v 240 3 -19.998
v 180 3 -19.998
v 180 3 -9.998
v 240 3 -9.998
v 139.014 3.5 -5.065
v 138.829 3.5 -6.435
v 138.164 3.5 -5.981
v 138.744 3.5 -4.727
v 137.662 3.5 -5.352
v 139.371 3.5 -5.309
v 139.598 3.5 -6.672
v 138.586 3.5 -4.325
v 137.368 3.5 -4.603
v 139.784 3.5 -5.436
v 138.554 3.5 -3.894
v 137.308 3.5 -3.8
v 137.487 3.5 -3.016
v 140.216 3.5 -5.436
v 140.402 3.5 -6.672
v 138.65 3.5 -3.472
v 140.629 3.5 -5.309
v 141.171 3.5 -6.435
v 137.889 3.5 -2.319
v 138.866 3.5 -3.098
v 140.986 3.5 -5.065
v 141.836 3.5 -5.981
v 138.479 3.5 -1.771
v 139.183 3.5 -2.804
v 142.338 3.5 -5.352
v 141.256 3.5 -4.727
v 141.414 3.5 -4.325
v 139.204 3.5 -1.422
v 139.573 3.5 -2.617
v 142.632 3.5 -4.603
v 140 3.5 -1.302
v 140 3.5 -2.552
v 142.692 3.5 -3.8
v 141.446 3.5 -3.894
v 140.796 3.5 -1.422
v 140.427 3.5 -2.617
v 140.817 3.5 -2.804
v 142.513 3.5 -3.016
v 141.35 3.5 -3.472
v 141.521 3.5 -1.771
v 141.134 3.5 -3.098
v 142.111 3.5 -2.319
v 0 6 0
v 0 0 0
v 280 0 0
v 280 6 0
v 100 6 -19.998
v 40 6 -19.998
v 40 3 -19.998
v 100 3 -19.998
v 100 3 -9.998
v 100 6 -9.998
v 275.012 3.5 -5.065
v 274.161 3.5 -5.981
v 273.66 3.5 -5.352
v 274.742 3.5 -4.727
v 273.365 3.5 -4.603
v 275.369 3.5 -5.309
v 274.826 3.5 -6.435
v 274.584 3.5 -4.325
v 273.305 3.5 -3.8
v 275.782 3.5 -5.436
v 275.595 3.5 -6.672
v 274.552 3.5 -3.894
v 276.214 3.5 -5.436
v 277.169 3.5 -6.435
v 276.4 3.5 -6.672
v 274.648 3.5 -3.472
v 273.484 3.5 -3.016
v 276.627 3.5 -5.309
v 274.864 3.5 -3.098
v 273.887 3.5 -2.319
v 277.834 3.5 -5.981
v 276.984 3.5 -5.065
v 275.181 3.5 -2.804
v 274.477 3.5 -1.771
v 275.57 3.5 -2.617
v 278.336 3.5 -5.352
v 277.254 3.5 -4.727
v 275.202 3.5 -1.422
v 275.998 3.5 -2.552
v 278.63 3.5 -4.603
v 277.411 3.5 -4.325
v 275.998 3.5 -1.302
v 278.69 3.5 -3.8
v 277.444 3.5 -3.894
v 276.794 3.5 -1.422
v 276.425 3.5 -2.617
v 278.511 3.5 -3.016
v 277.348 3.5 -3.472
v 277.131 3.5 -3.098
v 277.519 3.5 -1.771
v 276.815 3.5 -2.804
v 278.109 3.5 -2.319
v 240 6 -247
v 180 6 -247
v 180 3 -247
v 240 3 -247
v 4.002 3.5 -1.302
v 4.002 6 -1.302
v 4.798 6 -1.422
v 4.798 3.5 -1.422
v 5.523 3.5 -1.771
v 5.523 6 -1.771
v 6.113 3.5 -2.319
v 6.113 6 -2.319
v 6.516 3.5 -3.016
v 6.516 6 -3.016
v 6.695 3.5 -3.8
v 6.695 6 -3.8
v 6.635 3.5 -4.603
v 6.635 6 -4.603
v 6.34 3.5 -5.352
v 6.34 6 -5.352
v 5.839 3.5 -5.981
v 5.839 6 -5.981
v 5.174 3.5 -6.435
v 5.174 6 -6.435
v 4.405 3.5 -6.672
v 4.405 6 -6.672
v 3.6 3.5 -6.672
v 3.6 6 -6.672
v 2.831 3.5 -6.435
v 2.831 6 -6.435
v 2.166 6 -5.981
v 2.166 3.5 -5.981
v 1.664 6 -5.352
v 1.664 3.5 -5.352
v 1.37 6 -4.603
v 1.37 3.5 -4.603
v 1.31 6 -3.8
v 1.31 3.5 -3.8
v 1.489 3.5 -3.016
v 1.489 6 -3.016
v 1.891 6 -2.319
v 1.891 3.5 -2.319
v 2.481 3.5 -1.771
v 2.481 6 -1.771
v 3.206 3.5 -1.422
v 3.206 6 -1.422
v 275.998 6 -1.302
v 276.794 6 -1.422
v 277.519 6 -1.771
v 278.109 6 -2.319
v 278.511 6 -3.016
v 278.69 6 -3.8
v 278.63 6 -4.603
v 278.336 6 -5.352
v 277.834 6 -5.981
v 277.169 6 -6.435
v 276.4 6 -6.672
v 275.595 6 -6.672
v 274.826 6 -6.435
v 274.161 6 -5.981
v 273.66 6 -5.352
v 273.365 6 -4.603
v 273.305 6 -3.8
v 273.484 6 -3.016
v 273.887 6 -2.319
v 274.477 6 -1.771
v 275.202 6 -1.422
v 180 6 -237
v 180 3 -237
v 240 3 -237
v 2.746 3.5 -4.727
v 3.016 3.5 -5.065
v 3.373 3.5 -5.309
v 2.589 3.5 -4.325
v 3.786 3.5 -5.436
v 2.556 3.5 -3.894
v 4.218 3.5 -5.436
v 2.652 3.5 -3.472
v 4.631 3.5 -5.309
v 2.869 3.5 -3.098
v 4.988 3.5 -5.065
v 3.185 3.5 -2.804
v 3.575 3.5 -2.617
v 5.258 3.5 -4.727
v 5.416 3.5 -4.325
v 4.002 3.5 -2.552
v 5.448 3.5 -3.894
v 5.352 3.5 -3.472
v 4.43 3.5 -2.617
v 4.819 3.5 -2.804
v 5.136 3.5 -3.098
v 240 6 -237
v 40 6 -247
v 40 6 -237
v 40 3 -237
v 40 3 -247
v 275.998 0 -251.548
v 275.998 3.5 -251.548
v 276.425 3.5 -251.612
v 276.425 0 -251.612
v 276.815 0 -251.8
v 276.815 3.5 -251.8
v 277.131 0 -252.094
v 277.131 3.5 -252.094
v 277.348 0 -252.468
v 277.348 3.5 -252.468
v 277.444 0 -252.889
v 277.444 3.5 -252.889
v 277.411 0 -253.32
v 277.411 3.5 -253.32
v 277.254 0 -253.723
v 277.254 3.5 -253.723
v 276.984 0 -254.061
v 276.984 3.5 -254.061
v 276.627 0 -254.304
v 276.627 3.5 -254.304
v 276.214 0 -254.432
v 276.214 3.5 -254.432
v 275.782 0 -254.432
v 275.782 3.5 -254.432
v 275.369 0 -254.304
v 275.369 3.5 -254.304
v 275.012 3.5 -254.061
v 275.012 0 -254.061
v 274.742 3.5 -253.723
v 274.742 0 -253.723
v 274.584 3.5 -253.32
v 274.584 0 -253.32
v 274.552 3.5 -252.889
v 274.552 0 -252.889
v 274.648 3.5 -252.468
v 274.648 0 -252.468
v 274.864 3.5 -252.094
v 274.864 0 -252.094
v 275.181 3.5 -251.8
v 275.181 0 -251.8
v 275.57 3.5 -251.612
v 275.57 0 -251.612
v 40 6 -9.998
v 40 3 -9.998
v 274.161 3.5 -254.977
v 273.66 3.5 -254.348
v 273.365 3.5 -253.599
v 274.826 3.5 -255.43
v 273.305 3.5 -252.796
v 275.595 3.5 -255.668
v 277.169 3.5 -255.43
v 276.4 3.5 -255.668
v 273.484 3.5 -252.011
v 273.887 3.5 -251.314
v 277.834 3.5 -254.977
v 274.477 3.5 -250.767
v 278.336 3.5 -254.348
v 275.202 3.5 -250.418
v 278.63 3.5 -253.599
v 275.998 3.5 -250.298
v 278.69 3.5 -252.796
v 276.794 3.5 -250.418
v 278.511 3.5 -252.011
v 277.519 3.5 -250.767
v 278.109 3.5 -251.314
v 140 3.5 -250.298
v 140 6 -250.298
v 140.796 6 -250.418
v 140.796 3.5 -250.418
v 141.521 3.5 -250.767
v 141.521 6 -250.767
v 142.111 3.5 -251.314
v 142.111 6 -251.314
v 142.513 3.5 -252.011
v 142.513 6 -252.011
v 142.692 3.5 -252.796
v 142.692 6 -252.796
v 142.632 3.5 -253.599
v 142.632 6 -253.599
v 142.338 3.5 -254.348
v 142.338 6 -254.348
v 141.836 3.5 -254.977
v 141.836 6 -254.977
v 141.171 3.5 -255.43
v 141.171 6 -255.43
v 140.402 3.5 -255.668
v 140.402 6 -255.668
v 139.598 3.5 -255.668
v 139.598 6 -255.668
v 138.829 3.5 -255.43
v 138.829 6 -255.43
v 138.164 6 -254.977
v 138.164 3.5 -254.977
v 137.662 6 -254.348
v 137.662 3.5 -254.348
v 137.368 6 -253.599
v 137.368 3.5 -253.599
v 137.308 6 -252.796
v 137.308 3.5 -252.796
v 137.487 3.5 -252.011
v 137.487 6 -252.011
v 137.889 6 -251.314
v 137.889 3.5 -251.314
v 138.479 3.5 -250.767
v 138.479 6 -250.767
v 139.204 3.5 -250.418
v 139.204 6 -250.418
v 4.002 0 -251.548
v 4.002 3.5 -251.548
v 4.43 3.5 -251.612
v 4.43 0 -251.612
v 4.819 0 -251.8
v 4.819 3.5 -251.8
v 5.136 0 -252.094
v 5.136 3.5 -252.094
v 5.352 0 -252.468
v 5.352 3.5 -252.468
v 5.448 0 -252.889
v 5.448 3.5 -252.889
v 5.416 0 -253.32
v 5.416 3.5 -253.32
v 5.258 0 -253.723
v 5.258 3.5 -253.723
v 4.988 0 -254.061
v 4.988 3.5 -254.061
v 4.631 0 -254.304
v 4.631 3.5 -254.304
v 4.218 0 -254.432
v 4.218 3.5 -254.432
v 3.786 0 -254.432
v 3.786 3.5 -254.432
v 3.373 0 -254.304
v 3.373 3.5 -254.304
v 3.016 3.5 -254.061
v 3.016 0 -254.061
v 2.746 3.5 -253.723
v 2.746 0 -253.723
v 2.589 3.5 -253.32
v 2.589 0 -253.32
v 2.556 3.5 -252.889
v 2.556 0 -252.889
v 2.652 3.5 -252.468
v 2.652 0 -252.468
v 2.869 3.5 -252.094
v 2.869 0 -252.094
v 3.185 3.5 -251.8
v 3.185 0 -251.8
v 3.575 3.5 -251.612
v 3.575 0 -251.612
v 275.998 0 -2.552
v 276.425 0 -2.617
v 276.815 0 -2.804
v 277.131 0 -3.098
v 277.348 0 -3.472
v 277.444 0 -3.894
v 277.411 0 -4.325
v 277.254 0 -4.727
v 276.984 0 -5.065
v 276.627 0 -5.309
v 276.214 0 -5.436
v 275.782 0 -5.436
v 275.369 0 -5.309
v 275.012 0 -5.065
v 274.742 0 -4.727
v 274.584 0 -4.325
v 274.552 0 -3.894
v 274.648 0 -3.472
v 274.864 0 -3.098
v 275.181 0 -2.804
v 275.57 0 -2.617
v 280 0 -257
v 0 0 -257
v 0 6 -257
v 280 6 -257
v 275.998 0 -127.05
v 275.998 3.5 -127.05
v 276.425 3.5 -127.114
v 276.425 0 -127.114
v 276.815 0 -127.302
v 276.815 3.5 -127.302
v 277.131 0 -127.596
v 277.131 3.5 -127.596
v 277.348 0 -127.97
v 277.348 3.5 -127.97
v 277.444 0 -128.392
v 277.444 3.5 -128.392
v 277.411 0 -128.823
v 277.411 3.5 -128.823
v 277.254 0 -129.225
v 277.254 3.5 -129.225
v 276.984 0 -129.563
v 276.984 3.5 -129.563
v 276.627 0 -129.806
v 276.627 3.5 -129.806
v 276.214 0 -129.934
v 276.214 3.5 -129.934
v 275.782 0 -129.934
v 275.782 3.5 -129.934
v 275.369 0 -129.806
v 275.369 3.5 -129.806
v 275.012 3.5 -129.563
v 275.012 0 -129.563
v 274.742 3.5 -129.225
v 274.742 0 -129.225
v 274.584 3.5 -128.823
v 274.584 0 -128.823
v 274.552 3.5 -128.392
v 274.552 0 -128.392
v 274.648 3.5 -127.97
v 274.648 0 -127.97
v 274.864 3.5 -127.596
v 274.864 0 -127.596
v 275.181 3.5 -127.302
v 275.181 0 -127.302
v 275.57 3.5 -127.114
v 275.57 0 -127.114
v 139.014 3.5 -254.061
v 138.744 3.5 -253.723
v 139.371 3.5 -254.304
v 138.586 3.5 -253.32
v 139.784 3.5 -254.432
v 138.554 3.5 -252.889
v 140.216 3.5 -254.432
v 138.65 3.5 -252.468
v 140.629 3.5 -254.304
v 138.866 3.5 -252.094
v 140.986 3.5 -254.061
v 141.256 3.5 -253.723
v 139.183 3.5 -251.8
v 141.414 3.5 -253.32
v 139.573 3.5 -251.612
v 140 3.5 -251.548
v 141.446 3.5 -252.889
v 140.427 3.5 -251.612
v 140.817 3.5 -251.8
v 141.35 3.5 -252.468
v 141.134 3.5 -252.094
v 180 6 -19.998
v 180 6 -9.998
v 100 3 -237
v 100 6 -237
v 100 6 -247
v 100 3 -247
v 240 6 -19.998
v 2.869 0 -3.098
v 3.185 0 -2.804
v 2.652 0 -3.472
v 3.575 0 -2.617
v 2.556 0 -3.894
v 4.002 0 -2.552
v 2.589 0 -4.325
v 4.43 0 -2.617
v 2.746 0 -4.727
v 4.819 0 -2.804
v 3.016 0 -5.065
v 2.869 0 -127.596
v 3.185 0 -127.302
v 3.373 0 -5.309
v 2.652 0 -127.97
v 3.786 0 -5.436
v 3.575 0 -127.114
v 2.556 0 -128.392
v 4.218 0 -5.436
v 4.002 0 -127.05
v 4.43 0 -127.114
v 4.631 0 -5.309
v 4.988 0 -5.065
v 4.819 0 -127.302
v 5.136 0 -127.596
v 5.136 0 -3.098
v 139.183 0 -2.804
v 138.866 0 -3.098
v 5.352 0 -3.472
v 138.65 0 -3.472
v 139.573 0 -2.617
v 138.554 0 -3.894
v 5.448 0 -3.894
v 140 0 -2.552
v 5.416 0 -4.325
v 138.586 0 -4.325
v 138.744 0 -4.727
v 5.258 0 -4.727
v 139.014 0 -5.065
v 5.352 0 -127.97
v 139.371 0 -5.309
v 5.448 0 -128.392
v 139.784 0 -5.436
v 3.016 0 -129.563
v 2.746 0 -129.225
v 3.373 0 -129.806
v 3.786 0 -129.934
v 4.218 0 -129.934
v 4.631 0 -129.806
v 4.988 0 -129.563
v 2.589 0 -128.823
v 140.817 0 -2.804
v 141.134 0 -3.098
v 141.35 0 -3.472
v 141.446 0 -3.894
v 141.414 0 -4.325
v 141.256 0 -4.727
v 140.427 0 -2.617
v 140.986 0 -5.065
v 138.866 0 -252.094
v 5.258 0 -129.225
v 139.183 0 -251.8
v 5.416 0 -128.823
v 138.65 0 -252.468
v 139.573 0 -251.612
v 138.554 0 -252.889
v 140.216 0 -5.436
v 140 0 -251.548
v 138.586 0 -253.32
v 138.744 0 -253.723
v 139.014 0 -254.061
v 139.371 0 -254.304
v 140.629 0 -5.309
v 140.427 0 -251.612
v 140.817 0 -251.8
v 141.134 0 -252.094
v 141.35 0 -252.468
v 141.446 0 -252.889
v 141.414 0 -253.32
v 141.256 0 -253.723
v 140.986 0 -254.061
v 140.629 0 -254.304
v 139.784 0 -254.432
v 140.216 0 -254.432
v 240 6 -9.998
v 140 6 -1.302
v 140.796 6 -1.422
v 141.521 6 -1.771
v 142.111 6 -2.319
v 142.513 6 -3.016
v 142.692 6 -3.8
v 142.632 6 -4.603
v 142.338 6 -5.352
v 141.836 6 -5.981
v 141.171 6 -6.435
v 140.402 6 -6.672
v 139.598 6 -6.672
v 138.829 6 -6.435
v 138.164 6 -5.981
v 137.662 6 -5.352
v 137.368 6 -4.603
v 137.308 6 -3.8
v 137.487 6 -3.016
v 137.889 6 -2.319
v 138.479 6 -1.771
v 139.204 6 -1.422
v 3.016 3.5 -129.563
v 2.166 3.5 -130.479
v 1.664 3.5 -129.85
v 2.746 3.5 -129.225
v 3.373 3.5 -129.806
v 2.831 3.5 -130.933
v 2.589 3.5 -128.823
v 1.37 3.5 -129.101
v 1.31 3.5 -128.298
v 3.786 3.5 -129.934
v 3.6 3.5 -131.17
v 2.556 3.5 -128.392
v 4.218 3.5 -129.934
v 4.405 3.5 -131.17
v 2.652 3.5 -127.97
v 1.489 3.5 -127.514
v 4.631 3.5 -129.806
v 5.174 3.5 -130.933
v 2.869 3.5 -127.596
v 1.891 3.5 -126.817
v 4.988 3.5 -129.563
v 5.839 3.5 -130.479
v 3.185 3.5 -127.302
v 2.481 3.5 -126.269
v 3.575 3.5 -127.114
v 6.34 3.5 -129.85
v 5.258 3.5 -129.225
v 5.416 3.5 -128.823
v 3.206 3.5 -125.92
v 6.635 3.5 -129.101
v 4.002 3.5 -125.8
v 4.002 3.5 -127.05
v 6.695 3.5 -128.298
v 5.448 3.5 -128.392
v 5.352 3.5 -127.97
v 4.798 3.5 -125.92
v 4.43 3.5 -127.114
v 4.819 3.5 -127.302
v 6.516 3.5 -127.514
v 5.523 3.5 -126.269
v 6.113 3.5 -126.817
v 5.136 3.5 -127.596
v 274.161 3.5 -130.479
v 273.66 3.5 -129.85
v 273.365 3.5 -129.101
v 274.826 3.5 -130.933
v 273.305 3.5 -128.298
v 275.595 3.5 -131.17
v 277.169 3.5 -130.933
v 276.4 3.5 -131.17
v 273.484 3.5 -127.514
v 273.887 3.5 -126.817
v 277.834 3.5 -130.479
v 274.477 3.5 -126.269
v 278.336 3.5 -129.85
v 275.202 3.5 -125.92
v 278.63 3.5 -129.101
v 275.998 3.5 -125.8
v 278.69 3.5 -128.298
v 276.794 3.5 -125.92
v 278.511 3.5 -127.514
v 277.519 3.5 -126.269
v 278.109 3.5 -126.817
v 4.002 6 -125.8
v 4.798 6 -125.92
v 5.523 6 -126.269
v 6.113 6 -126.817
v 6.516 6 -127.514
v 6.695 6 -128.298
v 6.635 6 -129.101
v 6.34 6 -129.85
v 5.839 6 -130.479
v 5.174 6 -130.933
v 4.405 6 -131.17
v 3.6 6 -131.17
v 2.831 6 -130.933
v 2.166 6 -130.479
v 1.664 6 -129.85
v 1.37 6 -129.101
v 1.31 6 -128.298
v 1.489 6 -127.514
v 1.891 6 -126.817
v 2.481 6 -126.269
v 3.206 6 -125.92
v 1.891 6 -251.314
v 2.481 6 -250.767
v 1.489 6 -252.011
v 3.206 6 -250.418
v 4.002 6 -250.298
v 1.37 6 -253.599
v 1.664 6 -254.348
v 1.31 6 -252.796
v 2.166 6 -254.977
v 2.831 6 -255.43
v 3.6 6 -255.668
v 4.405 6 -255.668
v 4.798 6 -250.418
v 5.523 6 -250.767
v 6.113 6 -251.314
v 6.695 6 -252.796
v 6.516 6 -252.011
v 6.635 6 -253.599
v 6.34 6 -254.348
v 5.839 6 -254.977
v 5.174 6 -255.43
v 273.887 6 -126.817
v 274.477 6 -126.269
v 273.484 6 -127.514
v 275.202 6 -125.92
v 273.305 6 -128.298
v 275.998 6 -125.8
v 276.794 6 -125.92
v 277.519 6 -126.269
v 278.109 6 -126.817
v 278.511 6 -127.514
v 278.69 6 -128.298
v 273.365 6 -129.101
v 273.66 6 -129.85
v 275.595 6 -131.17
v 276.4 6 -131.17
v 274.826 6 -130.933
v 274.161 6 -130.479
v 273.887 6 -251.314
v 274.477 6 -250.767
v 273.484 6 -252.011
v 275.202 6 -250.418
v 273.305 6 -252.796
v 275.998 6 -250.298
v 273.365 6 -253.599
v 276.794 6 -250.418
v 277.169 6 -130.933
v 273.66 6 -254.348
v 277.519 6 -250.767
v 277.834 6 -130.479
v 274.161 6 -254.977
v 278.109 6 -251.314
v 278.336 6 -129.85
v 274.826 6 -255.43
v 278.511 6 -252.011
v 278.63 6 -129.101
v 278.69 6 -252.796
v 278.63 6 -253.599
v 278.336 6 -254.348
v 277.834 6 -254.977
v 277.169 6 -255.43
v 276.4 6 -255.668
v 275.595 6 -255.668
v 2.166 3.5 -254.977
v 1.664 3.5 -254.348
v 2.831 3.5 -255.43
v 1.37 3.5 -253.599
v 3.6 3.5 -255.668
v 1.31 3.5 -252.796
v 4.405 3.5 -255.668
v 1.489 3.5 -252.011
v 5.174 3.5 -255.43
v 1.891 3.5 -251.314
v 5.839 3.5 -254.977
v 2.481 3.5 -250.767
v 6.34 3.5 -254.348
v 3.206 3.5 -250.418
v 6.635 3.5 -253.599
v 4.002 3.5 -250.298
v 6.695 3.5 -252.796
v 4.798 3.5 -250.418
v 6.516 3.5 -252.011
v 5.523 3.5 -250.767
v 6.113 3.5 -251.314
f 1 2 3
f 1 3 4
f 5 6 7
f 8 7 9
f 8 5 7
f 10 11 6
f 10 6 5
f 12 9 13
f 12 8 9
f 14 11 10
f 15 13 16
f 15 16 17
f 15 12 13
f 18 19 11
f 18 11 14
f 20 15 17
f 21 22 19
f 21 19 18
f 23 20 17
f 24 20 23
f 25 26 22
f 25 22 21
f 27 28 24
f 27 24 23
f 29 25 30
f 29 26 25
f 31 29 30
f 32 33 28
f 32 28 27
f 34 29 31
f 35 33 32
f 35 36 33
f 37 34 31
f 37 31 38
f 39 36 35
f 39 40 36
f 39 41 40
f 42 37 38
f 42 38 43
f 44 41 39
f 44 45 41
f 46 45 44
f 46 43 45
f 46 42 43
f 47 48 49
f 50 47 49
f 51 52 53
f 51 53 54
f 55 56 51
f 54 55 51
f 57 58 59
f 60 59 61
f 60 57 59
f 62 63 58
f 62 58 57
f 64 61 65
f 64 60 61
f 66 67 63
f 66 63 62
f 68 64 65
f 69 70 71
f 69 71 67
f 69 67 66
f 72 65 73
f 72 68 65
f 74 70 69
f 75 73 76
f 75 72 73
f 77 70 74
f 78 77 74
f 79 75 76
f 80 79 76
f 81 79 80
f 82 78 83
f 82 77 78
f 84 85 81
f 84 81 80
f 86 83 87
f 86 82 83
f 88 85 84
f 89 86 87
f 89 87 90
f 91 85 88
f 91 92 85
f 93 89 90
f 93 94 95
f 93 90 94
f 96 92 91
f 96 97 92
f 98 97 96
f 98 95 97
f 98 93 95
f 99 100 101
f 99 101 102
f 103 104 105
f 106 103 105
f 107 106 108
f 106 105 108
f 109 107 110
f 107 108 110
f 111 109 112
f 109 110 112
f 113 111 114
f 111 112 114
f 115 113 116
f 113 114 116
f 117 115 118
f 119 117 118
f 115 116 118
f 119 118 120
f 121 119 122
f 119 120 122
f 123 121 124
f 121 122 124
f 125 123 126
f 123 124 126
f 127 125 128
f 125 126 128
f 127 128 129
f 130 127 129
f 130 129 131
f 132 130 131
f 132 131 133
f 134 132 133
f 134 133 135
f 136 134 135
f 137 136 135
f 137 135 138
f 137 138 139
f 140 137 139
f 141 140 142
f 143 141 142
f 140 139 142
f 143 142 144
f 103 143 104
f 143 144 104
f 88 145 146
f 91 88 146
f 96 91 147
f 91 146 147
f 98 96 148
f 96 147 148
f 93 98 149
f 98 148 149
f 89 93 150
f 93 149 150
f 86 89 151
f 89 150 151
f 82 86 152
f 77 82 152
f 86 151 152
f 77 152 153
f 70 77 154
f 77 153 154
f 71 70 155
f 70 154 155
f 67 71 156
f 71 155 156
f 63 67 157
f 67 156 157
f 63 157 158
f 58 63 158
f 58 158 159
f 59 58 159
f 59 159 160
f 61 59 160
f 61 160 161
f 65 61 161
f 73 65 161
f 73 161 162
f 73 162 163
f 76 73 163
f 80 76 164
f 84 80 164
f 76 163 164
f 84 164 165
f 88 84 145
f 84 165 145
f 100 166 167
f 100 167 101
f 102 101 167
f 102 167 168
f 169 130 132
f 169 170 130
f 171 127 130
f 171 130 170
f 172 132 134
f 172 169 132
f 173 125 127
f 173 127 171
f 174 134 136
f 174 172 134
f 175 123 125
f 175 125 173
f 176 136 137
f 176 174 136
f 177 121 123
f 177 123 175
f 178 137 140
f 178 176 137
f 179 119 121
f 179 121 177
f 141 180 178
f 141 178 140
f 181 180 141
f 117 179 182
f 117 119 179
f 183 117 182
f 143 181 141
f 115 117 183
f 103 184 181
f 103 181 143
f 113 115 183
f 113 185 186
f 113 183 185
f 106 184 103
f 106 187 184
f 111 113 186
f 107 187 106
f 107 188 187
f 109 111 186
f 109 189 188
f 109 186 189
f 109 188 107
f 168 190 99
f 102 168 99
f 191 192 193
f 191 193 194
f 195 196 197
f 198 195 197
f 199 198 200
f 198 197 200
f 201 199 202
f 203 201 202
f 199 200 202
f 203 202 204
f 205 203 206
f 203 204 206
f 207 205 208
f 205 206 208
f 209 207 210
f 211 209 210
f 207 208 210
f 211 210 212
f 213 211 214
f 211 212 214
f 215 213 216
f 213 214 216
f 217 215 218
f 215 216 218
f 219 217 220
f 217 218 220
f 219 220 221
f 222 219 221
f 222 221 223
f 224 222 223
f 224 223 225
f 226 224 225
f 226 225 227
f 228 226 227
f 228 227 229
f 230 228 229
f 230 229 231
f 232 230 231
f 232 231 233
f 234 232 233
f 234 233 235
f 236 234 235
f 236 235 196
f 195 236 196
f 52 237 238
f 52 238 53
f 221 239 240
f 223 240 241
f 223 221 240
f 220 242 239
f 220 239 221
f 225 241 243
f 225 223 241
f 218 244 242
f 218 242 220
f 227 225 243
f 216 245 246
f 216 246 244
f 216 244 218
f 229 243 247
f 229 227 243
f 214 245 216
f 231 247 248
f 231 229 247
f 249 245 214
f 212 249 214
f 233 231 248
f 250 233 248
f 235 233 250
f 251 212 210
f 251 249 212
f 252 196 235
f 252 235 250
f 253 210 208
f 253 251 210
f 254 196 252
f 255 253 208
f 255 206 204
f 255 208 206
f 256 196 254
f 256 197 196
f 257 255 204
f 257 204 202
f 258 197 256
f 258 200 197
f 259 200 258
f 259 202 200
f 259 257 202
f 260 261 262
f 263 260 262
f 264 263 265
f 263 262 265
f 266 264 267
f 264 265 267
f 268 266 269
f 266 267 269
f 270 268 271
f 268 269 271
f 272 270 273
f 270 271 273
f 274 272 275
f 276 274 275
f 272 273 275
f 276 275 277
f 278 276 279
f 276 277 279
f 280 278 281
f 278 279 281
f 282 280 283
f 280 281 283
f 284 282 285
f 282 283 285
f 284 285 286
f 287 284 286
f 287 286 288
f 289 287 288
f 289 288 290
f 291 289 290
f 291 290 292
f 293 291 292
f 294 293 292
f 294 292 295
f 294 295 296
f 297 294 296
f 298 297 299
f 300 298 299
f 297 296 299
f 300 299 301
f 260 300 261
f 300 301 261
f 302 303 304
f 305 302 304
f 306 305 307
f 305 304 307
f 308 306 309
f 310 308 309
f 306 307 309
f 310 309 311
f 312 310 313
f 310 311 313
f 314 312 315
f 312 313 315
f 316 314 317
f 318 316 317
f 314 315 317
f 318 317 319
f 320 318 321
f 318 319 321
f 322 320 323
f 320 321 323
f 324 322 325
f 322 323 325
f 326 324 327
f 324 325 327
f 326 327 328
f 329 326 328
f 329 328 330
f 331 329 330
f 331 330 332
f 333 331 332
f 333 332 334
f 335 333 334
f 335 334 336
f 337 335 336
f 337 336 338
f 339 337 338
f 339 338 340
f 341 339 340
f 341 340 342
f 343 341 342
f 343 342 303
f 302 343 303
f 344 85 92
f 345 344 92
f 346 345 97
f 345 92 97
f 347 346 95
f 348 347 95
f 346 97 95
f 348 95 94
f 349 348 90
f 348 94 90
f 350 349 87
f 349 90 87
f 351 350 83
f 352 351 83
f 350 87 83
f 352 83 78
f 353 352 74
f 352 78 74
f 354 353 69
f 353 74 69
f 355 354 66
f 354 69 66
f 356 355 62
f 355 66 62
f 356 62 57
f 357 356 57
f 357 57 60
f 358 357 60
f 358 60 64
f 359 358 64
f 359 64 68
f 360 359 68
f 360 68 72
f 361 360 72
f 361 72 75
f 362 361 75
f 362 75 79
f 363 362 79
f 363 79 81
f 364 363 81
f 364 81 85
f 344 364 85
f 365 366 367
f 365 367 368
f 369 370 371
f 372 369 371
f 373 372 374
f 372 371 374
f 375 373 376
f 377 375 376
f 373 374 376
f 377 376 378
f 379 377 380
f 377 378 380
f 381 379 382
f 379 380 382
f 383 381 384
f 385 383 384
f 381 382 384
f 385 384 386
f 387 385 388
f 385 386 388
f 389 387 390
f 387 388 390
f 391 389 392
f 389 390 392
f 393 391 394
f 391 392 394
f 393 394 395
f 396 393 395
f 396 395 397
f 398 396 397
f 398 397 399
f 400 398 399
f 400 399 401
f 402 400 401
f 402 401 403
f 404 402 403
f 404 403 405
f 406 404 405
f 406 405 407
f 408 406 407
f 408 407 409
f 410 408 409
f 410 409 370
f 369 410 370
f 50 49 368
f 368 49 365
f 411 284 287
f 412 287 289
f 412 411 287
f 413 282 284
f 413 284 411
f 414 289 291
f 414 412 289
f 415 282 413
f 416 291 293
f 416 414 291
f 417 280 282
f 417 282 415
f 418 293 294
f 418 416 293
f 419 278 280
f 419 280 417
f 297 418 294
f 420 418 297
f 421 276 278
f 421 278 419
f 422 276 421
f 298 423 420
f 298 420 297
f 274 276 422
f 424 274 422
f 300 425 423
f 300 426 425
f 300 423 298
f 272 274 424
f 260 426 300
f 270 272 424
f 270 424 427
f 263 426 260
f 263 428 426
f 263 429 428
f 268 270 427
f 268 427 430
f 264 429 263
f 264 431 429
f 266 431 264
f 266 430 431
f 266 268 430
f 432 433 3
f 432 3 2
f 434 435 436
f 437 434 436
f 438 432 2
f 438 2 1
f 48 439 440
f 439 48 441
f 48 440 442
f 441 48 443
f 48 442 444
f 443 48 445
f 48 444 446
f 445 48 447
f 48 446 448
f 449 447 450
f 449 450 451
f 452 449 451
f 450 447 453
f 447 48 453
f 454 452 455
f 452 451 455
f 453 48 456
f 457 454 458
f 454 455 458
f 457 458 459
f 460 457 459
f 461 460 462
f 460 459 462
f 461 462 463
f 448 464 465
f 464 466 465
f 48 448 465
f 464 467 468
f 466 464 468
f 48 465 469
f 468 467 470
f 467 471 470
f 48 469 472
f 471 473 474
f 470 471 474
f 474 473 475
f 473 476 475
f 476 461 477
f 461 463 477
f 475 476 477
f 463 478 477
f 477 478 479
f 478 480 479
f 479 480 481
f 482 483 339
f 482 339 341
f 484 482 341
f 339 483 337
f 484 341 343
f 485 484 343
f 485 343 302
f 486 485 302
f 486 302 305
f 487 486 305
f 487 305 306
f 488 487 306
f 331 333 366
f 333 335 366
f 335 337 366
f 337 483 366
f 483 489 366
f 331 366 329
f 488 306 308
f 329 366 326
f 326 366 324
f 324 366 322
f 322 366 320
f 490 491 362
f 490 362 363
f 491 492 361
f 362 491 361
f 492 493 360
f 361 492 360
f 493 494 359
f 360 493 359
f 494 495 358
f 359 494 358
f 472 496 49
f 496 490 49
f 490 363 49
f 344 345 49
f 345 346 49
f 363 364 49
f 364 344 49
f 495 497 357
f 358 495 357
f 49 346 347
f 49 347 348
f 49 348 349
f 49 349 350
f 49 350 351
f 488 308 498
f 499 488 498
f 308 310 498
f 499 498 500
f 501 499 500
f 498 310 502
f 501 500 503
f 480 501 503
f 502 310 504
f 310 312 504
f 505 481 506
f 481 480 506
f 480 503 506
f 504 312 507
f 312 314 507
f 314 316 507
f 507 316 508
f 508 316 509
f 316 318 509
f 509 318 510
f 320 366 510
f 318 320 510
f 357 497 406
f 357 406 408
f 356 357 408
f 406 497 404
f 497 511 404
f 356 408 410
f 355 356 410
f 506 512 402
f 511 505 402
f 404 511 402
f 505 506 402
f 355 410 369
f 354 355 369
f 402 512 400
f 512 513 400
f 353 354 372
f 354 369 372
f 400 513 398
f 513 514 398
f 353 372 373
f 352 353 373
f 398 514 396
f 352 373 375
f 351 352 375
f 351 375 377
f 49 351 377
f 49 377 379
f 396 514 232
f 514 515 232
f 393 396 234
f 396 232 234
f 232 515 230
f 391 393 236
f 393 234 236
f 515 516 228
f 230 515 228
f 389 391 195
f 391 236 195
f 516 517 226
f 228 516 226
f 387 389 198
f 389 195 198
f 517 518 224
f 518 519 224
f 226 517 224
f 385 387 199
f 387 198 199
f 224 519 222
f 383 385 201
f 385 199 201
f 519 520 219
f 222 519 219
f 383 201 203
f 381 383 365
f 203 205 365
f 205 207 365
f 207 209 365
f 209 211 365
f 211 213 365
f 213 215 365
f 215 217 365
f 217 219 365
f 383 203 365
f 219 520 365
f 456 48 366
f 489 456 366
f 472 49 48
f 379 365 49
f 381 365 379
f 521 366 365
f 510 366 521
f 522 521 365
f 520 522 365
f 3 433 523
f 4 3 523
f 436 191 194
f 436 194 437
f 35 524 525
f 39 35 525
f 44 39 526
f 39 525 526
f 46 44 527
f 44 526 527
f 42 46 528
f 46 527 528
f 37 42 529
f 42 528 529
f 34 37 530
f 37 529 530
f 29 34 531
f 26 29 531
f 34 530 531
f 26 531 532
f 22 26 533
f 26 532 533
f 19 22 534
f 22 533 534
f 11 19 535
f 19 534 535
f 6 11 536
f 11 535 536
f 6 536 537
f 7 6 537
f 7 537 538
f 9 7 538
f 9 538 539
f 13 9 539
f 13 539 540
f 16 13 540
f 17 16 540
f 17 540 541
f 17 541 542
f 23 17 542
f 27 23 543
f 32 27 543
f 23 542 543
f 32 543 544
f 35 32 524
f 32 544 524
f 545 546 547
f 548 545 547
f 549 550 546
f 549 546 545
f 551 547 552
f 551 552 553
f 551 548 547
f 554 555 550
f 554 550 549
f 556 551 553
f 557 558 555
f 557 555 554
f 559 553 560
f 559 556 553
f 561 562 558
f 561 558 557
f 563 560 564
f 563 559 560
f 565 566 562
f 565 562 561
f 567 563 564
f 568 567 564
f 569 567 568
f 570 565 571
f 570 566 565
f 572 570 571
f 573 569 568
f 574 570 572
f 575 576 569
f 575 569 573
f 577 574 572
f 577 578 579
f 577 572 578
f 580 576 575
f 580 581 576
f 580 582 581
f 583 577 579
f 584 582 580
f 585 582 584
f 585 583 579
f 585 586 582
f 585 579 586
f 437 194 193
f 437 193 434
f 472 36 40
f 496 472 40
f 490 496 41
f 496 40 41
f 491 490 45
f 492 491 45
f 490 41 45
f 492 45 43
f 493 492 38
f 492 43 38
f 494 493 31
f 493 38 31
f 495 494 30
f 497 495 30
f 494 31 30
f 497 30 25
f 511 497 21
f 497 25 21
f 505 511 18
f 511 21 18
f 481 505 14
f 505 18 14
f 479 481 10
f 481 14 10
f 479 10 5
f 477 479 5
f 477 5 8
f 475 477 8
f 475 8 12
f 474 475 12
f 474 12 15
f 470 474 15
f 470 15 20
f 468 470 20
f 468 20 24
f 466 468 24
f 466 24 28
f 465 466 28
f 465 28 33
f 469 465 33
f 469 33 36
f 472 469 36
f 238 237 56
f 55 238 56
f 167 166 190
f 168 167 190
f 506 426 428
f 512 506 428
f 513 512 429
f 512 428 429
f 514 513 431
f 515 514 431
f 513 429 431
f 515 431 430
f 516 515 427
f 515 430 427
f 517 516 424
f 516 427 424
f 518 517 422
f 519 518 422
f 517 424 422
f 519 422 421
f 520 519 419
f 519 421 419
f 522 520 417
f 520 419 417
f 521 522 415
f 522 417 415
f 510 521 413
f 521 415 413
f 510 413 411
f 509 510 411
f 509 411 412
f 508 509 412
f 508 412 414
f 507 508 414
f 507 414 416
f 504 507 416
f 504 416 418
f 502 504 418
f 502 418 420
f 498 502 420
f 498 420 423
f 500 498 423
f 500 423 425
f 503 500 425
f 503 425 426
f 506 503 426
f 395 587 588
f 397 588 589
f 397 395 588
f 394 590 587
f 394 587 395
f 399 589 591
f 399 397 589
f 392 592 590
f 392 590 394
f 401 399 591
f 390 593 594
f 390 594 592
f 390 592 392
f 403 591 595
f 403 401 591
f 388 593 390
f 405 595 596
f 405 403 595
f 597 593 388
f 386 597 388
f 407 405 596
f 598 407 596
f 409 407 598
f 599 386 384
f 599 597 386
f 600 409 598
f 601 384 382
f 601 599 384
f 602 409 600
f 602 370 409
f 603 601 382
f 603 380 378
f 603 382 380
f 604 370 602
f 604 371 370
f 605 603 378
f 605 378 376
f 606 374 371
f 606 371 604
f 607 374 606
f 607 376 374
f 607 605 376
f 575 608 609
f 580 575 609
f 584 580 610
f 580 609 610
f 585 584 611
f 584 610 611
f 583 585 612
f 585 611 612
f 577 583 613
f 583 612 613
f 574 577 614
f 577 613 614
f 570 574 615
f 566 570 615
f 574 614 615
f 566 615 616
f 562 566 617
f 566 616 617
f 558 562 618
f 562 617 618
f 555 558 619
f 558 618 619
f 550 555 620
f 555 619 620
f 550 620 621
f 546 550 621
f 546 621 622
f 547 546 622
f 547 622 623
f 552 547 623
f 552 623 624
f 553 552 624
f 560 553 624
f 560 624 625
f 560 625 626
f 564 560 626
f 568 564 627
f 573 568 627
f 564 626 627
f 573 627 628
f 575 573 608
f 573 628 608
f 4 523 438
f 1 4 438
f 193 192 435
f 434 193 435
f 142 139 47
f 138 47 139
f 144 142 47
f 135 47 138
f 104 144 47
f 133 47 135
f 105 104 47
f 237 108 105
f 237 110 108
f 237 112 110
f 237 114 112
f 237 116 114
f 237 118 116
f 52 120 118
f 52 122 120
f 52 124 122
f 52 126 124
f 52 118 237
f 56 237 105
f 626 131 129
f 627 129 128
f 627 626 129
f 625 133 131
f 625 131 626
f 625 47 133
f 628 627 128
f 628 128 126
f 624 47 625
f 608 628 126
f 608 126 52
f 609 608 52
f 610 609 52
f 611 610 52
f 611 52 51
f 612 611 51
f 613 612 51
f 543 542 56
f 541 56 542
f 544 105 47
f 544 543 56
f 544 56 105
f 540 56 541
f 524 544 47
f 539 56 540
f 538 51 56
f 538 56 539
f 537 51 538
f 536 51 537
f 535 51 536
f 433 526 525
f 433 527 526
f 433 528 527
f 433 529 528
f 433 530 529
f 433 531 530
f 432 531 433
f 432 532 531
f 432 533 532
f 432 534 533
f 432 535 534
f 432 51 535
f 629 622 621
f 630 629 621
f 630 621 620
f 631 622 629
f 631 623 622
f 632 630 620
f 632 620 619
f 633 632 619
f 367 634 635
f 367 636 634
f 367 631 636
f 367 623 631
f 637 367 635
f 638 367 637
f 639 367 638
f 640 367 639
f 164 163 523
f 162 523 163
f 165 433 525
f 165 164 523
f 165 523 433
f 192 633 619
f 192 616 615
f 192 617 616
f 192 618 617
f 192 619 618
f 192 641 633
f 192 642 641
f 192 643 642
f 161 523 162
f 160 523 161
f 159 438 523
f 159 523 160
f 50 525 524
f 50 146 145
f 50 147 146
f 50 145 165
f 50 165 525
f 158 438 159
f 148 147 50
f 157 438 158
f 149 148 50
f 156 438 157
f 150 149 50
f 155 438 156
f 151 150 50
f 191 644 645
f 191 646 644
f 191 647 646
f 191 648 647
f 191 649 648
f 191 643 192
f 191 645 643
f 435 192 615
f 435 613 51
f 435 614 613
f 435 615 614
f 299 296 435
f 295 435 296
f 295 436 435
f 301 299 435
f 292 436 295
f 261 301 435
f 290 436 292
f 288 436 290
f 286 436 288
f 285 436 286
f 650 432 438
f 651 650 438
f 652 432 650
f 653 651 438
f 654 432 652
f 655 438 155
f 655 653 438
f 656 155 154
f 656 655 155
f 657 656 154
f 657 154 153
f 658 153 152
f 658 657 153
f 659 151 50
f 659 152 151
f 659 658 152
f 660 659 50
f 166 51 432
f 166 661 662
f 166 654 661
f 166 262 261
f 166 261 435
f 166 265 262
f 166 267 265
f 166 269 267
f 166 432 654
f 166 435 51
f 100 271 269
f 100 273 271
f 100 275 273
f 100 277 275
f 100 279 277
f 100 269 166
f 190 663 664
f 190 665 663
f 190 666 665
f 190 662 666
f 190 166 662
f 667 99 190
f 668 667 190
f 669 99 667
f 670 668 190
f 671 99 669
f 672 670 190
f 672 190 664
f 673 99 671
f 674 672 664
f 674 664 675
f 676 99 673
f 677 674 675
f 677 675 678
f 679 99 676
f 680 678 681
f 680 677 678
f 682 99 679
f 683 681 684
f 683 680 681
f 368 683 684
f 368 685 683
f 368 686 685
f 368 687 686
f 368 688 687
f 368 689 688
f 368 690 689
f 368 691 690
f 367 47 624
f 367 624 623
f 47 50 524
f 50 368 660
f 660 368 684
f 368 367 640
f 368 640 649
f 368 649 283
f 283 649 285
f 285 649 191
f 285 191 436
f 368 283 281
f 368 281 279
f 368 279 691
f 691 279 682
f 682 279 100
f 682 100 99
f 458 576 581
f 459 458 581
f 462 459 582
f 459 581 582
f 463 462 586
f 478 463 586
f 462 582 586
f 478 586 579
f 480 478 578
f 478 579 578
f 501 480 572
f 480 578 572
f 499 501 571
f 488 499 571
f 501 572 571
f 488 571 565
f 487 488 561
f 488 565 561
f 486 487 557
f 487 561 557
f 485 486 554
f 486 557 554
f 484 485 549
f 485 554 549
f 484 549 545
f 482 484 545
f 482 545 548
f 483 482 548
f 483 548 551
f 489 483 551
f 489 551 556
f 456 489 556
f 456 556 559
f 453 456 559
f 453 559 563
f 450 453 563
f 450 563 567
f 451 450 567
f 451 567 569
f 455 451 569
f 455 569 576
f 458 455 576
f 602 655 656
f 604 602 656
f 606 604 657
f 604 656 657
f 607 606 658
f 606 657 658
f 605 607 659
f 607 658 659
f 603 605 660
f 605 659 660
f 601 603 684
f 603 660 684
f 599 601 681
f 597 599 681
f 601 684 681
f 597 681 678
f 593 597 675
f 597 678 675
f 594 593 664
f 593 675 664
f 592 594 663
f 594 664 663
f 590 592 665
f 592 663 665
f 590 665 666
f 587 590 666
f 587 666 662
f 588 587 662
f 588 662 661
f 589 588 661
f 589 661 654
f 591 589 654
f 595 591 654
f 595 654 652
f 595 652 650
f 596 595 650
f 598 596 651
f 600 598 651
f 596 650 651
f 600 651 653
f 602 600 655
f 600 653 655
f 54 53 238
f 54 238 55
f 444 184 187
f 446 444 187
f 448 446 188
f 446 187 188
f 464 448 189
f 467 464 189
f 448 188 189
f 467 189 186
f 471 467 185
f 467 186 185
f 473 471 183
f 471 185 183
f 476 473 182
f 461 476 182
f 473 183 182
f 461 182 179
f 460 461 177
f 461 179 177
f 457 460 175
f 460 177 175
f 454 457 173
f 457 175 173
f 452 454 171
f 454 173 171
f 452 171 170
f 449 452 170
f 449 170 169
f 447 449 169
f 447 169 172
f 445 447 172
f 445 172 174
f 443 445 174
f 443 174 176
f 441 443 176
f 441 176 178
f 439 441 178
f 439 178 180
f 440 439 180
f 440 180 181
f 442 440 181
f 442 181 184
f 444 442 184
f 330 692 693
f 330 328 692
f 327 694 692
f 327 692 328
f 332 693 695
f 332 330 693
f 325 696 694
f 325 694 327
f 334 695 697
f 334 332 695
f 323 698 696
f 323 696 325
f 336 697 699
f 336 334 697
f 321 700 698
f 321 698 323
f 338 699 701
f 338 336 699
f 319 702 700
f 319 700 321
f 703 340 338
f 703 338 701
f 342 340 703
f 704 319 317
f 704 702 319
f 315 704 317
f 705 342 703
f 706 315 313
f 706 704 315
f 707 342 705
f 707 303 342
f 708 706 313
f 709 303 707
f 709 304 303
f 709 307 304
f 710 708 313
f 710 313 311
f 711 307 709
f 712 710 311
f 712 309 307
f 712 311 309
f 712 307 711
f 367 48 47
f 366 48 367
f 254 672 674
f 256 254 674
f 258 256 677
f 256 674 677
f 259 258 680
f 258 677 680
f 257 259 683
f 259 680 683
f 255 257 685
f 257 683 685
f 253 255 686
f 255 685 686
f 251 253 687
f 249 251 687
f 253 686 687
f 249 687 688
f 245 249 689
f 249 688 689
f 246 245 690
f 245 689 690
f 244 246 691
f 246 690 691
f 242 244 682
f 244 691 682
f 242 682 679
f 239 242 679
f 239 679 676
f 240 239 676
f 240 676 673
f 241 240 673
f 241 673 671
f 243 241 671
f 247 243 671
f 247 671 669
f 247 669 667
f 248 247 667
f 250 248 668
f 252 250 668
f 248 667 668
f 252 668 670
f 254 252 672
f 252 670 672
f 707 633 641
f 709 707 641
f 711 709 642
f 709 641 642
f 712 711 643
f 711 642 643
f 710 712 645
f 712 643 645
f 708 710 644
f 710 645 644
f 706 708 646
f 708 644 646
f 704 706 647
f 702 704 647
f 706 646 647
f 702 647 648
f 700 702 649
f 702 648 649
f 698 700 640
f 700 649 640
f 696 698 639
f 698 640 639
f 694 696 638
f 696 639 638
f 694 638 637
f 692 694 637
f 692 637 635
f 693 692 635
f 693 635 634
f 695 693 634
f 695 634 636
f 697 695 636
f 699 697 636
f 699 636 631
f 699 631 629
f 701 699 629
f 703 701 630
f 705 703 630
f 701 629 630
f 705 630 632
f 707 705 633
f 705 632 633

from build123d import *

# Parameters (mm, degrees)
SKETCH1_W           = 280
SKETCH1_H           = 257
BOSS_EXTRUDE2_DEPTH = 6
SKETCH3_R           = 1.45
CUT_EXTRUDE1_DEPTH  = 381.111825651
SKETCH4_R           = 2.7
CUT_EXTRUDE4_DEPTH  = 2.5
SKETCH8_W           = 60
SKETCH8_H           = 10
CUT_EXTRUDE5_DEPTH  = 3


with BuildPart() as part:
    # Sketch1 → Boss-Extrude2 (new body)
    with BuildSketch(Plane(origin=(0, 0, 0), x_dir=(1, 0, 0), z_dir=(0, 1, 0))):
        with Locations((140, 128.5)):
            Rectangle(SKETCH1_W, SKETCH1_H)
    extrude(amount=BOSS_EXTRUDE2_DEPTH)

    # Sketch3 → Cut-Extrude1 (cut, through all)
    with BuildSketch(Plane(origin=(0, 6, 0), x_dir=(1, 0, 0), z_dir=(0, 1, 0))):
        with Locations(Location((4.002224382, 252.997775618, 0), (0, 0, 270))):
            Circle(SKETCH3_R)
        with Locations(Location((275.997775618, 252.997775618, 0), (0, 0, 270))):
            Circle(SKETCH3_R)
        with Locations(Location((4.002224382, 4.002224382, 0), (0, 0, 270))):
            Circle(SKETCH3_R)
        with Locations(Location((275.997775618, 4.002224382, 0), (0, 0, 270))):
            Circle(SKETCH3_R)
        with Locations(Location((4.002224382, 128.5, 0), (0, 0, 270))):
            Circle(SKETCH3_R)
        with Locations(Location((275.997775618, 128.5, 0), (0, 0, 270))):
            Circle(SKETCH3_R)
        with Locations(Location((140, 4.002224382, 0), (0, 0, 270))):
            Circle(SKETCH3_R)
        with Locations(Location((140, 252.997775618, 0), (0, 0, 270))):
            Circle(SKETCH3_R)
    extrude(amount=-CUT_EXTRUDE1_DEPTH, mode=Mode.SUBTRACT)

    # Sketch4 → Cut-Extrude4 (cut)
    with BuildSketch(Plane(origin=(0, 6, 0), x_dir=(1, 0, 0), z_dir=(0, 1, 0))):
        with Locations(Location((4.002224382, 4.002224382, 0), (0, 0, 270))):
            Circle(SKETCH4_R)
        with Locations(Location((4.002224382, 252.997775618, 0), (0, 0, 270))):
            Circle(SKETCH4_R)
        with Locations(Location((275.997775618, 252.997775618, 0), (0, 0, 270))):
            Circle(SKETCH4_R)
        with Locations(Location((275.997775618, 4.002224382, 0), (0, 0, 270))):
            Circle(SKETCH4_R)
        with Locations(Location((4.002224382, 128.5, 0), (0, 0, 270))):
            Circle(SKETCH4_R)
        with Locations(Location((275.997775618, 128.5, 0), (0, 0, 270))):
            Circle(SKETCH4_R)
        with Locations(Location((140, 252.997775618, 0), (0, 0, 270))):
            Circle(SKETCH4_R)
        with Locations(Location((140, 4.002224382, 0), (0, 0, 270))):
            Circle(SKETCH4_R)
    extrude(amount=-CUT_EXTRUDE4_DEPTH, mode=Mode.SUBTRACT)

    # Sketch8 → Cut-Extrude5 (cut)
    with BuildSketch(Plane(origin=(0, 6, 0), x_dir=(1, 0, 0), z_dir=(0, 1, 0))):
        with Locations((70, 242)):
            Rectangle(SKETCH8_W, SKETCH8_H)
        with Locations((70, 14.997514144)):
            Rectangle(SKETCH8_W, SKETCH8_H)
        with Locations((210, 14.997514144)):
            Rectangle(SKETCH8_W, SKETCH8_H)
        with Locations((210, 242)):
            Rectangle(SKETCH8_W, SKETCH8_H)
    extrude(amount=-CUT_EXTRUDE5_DEPTH, mode=Mode.SUBTRACT)


solid = part.part
